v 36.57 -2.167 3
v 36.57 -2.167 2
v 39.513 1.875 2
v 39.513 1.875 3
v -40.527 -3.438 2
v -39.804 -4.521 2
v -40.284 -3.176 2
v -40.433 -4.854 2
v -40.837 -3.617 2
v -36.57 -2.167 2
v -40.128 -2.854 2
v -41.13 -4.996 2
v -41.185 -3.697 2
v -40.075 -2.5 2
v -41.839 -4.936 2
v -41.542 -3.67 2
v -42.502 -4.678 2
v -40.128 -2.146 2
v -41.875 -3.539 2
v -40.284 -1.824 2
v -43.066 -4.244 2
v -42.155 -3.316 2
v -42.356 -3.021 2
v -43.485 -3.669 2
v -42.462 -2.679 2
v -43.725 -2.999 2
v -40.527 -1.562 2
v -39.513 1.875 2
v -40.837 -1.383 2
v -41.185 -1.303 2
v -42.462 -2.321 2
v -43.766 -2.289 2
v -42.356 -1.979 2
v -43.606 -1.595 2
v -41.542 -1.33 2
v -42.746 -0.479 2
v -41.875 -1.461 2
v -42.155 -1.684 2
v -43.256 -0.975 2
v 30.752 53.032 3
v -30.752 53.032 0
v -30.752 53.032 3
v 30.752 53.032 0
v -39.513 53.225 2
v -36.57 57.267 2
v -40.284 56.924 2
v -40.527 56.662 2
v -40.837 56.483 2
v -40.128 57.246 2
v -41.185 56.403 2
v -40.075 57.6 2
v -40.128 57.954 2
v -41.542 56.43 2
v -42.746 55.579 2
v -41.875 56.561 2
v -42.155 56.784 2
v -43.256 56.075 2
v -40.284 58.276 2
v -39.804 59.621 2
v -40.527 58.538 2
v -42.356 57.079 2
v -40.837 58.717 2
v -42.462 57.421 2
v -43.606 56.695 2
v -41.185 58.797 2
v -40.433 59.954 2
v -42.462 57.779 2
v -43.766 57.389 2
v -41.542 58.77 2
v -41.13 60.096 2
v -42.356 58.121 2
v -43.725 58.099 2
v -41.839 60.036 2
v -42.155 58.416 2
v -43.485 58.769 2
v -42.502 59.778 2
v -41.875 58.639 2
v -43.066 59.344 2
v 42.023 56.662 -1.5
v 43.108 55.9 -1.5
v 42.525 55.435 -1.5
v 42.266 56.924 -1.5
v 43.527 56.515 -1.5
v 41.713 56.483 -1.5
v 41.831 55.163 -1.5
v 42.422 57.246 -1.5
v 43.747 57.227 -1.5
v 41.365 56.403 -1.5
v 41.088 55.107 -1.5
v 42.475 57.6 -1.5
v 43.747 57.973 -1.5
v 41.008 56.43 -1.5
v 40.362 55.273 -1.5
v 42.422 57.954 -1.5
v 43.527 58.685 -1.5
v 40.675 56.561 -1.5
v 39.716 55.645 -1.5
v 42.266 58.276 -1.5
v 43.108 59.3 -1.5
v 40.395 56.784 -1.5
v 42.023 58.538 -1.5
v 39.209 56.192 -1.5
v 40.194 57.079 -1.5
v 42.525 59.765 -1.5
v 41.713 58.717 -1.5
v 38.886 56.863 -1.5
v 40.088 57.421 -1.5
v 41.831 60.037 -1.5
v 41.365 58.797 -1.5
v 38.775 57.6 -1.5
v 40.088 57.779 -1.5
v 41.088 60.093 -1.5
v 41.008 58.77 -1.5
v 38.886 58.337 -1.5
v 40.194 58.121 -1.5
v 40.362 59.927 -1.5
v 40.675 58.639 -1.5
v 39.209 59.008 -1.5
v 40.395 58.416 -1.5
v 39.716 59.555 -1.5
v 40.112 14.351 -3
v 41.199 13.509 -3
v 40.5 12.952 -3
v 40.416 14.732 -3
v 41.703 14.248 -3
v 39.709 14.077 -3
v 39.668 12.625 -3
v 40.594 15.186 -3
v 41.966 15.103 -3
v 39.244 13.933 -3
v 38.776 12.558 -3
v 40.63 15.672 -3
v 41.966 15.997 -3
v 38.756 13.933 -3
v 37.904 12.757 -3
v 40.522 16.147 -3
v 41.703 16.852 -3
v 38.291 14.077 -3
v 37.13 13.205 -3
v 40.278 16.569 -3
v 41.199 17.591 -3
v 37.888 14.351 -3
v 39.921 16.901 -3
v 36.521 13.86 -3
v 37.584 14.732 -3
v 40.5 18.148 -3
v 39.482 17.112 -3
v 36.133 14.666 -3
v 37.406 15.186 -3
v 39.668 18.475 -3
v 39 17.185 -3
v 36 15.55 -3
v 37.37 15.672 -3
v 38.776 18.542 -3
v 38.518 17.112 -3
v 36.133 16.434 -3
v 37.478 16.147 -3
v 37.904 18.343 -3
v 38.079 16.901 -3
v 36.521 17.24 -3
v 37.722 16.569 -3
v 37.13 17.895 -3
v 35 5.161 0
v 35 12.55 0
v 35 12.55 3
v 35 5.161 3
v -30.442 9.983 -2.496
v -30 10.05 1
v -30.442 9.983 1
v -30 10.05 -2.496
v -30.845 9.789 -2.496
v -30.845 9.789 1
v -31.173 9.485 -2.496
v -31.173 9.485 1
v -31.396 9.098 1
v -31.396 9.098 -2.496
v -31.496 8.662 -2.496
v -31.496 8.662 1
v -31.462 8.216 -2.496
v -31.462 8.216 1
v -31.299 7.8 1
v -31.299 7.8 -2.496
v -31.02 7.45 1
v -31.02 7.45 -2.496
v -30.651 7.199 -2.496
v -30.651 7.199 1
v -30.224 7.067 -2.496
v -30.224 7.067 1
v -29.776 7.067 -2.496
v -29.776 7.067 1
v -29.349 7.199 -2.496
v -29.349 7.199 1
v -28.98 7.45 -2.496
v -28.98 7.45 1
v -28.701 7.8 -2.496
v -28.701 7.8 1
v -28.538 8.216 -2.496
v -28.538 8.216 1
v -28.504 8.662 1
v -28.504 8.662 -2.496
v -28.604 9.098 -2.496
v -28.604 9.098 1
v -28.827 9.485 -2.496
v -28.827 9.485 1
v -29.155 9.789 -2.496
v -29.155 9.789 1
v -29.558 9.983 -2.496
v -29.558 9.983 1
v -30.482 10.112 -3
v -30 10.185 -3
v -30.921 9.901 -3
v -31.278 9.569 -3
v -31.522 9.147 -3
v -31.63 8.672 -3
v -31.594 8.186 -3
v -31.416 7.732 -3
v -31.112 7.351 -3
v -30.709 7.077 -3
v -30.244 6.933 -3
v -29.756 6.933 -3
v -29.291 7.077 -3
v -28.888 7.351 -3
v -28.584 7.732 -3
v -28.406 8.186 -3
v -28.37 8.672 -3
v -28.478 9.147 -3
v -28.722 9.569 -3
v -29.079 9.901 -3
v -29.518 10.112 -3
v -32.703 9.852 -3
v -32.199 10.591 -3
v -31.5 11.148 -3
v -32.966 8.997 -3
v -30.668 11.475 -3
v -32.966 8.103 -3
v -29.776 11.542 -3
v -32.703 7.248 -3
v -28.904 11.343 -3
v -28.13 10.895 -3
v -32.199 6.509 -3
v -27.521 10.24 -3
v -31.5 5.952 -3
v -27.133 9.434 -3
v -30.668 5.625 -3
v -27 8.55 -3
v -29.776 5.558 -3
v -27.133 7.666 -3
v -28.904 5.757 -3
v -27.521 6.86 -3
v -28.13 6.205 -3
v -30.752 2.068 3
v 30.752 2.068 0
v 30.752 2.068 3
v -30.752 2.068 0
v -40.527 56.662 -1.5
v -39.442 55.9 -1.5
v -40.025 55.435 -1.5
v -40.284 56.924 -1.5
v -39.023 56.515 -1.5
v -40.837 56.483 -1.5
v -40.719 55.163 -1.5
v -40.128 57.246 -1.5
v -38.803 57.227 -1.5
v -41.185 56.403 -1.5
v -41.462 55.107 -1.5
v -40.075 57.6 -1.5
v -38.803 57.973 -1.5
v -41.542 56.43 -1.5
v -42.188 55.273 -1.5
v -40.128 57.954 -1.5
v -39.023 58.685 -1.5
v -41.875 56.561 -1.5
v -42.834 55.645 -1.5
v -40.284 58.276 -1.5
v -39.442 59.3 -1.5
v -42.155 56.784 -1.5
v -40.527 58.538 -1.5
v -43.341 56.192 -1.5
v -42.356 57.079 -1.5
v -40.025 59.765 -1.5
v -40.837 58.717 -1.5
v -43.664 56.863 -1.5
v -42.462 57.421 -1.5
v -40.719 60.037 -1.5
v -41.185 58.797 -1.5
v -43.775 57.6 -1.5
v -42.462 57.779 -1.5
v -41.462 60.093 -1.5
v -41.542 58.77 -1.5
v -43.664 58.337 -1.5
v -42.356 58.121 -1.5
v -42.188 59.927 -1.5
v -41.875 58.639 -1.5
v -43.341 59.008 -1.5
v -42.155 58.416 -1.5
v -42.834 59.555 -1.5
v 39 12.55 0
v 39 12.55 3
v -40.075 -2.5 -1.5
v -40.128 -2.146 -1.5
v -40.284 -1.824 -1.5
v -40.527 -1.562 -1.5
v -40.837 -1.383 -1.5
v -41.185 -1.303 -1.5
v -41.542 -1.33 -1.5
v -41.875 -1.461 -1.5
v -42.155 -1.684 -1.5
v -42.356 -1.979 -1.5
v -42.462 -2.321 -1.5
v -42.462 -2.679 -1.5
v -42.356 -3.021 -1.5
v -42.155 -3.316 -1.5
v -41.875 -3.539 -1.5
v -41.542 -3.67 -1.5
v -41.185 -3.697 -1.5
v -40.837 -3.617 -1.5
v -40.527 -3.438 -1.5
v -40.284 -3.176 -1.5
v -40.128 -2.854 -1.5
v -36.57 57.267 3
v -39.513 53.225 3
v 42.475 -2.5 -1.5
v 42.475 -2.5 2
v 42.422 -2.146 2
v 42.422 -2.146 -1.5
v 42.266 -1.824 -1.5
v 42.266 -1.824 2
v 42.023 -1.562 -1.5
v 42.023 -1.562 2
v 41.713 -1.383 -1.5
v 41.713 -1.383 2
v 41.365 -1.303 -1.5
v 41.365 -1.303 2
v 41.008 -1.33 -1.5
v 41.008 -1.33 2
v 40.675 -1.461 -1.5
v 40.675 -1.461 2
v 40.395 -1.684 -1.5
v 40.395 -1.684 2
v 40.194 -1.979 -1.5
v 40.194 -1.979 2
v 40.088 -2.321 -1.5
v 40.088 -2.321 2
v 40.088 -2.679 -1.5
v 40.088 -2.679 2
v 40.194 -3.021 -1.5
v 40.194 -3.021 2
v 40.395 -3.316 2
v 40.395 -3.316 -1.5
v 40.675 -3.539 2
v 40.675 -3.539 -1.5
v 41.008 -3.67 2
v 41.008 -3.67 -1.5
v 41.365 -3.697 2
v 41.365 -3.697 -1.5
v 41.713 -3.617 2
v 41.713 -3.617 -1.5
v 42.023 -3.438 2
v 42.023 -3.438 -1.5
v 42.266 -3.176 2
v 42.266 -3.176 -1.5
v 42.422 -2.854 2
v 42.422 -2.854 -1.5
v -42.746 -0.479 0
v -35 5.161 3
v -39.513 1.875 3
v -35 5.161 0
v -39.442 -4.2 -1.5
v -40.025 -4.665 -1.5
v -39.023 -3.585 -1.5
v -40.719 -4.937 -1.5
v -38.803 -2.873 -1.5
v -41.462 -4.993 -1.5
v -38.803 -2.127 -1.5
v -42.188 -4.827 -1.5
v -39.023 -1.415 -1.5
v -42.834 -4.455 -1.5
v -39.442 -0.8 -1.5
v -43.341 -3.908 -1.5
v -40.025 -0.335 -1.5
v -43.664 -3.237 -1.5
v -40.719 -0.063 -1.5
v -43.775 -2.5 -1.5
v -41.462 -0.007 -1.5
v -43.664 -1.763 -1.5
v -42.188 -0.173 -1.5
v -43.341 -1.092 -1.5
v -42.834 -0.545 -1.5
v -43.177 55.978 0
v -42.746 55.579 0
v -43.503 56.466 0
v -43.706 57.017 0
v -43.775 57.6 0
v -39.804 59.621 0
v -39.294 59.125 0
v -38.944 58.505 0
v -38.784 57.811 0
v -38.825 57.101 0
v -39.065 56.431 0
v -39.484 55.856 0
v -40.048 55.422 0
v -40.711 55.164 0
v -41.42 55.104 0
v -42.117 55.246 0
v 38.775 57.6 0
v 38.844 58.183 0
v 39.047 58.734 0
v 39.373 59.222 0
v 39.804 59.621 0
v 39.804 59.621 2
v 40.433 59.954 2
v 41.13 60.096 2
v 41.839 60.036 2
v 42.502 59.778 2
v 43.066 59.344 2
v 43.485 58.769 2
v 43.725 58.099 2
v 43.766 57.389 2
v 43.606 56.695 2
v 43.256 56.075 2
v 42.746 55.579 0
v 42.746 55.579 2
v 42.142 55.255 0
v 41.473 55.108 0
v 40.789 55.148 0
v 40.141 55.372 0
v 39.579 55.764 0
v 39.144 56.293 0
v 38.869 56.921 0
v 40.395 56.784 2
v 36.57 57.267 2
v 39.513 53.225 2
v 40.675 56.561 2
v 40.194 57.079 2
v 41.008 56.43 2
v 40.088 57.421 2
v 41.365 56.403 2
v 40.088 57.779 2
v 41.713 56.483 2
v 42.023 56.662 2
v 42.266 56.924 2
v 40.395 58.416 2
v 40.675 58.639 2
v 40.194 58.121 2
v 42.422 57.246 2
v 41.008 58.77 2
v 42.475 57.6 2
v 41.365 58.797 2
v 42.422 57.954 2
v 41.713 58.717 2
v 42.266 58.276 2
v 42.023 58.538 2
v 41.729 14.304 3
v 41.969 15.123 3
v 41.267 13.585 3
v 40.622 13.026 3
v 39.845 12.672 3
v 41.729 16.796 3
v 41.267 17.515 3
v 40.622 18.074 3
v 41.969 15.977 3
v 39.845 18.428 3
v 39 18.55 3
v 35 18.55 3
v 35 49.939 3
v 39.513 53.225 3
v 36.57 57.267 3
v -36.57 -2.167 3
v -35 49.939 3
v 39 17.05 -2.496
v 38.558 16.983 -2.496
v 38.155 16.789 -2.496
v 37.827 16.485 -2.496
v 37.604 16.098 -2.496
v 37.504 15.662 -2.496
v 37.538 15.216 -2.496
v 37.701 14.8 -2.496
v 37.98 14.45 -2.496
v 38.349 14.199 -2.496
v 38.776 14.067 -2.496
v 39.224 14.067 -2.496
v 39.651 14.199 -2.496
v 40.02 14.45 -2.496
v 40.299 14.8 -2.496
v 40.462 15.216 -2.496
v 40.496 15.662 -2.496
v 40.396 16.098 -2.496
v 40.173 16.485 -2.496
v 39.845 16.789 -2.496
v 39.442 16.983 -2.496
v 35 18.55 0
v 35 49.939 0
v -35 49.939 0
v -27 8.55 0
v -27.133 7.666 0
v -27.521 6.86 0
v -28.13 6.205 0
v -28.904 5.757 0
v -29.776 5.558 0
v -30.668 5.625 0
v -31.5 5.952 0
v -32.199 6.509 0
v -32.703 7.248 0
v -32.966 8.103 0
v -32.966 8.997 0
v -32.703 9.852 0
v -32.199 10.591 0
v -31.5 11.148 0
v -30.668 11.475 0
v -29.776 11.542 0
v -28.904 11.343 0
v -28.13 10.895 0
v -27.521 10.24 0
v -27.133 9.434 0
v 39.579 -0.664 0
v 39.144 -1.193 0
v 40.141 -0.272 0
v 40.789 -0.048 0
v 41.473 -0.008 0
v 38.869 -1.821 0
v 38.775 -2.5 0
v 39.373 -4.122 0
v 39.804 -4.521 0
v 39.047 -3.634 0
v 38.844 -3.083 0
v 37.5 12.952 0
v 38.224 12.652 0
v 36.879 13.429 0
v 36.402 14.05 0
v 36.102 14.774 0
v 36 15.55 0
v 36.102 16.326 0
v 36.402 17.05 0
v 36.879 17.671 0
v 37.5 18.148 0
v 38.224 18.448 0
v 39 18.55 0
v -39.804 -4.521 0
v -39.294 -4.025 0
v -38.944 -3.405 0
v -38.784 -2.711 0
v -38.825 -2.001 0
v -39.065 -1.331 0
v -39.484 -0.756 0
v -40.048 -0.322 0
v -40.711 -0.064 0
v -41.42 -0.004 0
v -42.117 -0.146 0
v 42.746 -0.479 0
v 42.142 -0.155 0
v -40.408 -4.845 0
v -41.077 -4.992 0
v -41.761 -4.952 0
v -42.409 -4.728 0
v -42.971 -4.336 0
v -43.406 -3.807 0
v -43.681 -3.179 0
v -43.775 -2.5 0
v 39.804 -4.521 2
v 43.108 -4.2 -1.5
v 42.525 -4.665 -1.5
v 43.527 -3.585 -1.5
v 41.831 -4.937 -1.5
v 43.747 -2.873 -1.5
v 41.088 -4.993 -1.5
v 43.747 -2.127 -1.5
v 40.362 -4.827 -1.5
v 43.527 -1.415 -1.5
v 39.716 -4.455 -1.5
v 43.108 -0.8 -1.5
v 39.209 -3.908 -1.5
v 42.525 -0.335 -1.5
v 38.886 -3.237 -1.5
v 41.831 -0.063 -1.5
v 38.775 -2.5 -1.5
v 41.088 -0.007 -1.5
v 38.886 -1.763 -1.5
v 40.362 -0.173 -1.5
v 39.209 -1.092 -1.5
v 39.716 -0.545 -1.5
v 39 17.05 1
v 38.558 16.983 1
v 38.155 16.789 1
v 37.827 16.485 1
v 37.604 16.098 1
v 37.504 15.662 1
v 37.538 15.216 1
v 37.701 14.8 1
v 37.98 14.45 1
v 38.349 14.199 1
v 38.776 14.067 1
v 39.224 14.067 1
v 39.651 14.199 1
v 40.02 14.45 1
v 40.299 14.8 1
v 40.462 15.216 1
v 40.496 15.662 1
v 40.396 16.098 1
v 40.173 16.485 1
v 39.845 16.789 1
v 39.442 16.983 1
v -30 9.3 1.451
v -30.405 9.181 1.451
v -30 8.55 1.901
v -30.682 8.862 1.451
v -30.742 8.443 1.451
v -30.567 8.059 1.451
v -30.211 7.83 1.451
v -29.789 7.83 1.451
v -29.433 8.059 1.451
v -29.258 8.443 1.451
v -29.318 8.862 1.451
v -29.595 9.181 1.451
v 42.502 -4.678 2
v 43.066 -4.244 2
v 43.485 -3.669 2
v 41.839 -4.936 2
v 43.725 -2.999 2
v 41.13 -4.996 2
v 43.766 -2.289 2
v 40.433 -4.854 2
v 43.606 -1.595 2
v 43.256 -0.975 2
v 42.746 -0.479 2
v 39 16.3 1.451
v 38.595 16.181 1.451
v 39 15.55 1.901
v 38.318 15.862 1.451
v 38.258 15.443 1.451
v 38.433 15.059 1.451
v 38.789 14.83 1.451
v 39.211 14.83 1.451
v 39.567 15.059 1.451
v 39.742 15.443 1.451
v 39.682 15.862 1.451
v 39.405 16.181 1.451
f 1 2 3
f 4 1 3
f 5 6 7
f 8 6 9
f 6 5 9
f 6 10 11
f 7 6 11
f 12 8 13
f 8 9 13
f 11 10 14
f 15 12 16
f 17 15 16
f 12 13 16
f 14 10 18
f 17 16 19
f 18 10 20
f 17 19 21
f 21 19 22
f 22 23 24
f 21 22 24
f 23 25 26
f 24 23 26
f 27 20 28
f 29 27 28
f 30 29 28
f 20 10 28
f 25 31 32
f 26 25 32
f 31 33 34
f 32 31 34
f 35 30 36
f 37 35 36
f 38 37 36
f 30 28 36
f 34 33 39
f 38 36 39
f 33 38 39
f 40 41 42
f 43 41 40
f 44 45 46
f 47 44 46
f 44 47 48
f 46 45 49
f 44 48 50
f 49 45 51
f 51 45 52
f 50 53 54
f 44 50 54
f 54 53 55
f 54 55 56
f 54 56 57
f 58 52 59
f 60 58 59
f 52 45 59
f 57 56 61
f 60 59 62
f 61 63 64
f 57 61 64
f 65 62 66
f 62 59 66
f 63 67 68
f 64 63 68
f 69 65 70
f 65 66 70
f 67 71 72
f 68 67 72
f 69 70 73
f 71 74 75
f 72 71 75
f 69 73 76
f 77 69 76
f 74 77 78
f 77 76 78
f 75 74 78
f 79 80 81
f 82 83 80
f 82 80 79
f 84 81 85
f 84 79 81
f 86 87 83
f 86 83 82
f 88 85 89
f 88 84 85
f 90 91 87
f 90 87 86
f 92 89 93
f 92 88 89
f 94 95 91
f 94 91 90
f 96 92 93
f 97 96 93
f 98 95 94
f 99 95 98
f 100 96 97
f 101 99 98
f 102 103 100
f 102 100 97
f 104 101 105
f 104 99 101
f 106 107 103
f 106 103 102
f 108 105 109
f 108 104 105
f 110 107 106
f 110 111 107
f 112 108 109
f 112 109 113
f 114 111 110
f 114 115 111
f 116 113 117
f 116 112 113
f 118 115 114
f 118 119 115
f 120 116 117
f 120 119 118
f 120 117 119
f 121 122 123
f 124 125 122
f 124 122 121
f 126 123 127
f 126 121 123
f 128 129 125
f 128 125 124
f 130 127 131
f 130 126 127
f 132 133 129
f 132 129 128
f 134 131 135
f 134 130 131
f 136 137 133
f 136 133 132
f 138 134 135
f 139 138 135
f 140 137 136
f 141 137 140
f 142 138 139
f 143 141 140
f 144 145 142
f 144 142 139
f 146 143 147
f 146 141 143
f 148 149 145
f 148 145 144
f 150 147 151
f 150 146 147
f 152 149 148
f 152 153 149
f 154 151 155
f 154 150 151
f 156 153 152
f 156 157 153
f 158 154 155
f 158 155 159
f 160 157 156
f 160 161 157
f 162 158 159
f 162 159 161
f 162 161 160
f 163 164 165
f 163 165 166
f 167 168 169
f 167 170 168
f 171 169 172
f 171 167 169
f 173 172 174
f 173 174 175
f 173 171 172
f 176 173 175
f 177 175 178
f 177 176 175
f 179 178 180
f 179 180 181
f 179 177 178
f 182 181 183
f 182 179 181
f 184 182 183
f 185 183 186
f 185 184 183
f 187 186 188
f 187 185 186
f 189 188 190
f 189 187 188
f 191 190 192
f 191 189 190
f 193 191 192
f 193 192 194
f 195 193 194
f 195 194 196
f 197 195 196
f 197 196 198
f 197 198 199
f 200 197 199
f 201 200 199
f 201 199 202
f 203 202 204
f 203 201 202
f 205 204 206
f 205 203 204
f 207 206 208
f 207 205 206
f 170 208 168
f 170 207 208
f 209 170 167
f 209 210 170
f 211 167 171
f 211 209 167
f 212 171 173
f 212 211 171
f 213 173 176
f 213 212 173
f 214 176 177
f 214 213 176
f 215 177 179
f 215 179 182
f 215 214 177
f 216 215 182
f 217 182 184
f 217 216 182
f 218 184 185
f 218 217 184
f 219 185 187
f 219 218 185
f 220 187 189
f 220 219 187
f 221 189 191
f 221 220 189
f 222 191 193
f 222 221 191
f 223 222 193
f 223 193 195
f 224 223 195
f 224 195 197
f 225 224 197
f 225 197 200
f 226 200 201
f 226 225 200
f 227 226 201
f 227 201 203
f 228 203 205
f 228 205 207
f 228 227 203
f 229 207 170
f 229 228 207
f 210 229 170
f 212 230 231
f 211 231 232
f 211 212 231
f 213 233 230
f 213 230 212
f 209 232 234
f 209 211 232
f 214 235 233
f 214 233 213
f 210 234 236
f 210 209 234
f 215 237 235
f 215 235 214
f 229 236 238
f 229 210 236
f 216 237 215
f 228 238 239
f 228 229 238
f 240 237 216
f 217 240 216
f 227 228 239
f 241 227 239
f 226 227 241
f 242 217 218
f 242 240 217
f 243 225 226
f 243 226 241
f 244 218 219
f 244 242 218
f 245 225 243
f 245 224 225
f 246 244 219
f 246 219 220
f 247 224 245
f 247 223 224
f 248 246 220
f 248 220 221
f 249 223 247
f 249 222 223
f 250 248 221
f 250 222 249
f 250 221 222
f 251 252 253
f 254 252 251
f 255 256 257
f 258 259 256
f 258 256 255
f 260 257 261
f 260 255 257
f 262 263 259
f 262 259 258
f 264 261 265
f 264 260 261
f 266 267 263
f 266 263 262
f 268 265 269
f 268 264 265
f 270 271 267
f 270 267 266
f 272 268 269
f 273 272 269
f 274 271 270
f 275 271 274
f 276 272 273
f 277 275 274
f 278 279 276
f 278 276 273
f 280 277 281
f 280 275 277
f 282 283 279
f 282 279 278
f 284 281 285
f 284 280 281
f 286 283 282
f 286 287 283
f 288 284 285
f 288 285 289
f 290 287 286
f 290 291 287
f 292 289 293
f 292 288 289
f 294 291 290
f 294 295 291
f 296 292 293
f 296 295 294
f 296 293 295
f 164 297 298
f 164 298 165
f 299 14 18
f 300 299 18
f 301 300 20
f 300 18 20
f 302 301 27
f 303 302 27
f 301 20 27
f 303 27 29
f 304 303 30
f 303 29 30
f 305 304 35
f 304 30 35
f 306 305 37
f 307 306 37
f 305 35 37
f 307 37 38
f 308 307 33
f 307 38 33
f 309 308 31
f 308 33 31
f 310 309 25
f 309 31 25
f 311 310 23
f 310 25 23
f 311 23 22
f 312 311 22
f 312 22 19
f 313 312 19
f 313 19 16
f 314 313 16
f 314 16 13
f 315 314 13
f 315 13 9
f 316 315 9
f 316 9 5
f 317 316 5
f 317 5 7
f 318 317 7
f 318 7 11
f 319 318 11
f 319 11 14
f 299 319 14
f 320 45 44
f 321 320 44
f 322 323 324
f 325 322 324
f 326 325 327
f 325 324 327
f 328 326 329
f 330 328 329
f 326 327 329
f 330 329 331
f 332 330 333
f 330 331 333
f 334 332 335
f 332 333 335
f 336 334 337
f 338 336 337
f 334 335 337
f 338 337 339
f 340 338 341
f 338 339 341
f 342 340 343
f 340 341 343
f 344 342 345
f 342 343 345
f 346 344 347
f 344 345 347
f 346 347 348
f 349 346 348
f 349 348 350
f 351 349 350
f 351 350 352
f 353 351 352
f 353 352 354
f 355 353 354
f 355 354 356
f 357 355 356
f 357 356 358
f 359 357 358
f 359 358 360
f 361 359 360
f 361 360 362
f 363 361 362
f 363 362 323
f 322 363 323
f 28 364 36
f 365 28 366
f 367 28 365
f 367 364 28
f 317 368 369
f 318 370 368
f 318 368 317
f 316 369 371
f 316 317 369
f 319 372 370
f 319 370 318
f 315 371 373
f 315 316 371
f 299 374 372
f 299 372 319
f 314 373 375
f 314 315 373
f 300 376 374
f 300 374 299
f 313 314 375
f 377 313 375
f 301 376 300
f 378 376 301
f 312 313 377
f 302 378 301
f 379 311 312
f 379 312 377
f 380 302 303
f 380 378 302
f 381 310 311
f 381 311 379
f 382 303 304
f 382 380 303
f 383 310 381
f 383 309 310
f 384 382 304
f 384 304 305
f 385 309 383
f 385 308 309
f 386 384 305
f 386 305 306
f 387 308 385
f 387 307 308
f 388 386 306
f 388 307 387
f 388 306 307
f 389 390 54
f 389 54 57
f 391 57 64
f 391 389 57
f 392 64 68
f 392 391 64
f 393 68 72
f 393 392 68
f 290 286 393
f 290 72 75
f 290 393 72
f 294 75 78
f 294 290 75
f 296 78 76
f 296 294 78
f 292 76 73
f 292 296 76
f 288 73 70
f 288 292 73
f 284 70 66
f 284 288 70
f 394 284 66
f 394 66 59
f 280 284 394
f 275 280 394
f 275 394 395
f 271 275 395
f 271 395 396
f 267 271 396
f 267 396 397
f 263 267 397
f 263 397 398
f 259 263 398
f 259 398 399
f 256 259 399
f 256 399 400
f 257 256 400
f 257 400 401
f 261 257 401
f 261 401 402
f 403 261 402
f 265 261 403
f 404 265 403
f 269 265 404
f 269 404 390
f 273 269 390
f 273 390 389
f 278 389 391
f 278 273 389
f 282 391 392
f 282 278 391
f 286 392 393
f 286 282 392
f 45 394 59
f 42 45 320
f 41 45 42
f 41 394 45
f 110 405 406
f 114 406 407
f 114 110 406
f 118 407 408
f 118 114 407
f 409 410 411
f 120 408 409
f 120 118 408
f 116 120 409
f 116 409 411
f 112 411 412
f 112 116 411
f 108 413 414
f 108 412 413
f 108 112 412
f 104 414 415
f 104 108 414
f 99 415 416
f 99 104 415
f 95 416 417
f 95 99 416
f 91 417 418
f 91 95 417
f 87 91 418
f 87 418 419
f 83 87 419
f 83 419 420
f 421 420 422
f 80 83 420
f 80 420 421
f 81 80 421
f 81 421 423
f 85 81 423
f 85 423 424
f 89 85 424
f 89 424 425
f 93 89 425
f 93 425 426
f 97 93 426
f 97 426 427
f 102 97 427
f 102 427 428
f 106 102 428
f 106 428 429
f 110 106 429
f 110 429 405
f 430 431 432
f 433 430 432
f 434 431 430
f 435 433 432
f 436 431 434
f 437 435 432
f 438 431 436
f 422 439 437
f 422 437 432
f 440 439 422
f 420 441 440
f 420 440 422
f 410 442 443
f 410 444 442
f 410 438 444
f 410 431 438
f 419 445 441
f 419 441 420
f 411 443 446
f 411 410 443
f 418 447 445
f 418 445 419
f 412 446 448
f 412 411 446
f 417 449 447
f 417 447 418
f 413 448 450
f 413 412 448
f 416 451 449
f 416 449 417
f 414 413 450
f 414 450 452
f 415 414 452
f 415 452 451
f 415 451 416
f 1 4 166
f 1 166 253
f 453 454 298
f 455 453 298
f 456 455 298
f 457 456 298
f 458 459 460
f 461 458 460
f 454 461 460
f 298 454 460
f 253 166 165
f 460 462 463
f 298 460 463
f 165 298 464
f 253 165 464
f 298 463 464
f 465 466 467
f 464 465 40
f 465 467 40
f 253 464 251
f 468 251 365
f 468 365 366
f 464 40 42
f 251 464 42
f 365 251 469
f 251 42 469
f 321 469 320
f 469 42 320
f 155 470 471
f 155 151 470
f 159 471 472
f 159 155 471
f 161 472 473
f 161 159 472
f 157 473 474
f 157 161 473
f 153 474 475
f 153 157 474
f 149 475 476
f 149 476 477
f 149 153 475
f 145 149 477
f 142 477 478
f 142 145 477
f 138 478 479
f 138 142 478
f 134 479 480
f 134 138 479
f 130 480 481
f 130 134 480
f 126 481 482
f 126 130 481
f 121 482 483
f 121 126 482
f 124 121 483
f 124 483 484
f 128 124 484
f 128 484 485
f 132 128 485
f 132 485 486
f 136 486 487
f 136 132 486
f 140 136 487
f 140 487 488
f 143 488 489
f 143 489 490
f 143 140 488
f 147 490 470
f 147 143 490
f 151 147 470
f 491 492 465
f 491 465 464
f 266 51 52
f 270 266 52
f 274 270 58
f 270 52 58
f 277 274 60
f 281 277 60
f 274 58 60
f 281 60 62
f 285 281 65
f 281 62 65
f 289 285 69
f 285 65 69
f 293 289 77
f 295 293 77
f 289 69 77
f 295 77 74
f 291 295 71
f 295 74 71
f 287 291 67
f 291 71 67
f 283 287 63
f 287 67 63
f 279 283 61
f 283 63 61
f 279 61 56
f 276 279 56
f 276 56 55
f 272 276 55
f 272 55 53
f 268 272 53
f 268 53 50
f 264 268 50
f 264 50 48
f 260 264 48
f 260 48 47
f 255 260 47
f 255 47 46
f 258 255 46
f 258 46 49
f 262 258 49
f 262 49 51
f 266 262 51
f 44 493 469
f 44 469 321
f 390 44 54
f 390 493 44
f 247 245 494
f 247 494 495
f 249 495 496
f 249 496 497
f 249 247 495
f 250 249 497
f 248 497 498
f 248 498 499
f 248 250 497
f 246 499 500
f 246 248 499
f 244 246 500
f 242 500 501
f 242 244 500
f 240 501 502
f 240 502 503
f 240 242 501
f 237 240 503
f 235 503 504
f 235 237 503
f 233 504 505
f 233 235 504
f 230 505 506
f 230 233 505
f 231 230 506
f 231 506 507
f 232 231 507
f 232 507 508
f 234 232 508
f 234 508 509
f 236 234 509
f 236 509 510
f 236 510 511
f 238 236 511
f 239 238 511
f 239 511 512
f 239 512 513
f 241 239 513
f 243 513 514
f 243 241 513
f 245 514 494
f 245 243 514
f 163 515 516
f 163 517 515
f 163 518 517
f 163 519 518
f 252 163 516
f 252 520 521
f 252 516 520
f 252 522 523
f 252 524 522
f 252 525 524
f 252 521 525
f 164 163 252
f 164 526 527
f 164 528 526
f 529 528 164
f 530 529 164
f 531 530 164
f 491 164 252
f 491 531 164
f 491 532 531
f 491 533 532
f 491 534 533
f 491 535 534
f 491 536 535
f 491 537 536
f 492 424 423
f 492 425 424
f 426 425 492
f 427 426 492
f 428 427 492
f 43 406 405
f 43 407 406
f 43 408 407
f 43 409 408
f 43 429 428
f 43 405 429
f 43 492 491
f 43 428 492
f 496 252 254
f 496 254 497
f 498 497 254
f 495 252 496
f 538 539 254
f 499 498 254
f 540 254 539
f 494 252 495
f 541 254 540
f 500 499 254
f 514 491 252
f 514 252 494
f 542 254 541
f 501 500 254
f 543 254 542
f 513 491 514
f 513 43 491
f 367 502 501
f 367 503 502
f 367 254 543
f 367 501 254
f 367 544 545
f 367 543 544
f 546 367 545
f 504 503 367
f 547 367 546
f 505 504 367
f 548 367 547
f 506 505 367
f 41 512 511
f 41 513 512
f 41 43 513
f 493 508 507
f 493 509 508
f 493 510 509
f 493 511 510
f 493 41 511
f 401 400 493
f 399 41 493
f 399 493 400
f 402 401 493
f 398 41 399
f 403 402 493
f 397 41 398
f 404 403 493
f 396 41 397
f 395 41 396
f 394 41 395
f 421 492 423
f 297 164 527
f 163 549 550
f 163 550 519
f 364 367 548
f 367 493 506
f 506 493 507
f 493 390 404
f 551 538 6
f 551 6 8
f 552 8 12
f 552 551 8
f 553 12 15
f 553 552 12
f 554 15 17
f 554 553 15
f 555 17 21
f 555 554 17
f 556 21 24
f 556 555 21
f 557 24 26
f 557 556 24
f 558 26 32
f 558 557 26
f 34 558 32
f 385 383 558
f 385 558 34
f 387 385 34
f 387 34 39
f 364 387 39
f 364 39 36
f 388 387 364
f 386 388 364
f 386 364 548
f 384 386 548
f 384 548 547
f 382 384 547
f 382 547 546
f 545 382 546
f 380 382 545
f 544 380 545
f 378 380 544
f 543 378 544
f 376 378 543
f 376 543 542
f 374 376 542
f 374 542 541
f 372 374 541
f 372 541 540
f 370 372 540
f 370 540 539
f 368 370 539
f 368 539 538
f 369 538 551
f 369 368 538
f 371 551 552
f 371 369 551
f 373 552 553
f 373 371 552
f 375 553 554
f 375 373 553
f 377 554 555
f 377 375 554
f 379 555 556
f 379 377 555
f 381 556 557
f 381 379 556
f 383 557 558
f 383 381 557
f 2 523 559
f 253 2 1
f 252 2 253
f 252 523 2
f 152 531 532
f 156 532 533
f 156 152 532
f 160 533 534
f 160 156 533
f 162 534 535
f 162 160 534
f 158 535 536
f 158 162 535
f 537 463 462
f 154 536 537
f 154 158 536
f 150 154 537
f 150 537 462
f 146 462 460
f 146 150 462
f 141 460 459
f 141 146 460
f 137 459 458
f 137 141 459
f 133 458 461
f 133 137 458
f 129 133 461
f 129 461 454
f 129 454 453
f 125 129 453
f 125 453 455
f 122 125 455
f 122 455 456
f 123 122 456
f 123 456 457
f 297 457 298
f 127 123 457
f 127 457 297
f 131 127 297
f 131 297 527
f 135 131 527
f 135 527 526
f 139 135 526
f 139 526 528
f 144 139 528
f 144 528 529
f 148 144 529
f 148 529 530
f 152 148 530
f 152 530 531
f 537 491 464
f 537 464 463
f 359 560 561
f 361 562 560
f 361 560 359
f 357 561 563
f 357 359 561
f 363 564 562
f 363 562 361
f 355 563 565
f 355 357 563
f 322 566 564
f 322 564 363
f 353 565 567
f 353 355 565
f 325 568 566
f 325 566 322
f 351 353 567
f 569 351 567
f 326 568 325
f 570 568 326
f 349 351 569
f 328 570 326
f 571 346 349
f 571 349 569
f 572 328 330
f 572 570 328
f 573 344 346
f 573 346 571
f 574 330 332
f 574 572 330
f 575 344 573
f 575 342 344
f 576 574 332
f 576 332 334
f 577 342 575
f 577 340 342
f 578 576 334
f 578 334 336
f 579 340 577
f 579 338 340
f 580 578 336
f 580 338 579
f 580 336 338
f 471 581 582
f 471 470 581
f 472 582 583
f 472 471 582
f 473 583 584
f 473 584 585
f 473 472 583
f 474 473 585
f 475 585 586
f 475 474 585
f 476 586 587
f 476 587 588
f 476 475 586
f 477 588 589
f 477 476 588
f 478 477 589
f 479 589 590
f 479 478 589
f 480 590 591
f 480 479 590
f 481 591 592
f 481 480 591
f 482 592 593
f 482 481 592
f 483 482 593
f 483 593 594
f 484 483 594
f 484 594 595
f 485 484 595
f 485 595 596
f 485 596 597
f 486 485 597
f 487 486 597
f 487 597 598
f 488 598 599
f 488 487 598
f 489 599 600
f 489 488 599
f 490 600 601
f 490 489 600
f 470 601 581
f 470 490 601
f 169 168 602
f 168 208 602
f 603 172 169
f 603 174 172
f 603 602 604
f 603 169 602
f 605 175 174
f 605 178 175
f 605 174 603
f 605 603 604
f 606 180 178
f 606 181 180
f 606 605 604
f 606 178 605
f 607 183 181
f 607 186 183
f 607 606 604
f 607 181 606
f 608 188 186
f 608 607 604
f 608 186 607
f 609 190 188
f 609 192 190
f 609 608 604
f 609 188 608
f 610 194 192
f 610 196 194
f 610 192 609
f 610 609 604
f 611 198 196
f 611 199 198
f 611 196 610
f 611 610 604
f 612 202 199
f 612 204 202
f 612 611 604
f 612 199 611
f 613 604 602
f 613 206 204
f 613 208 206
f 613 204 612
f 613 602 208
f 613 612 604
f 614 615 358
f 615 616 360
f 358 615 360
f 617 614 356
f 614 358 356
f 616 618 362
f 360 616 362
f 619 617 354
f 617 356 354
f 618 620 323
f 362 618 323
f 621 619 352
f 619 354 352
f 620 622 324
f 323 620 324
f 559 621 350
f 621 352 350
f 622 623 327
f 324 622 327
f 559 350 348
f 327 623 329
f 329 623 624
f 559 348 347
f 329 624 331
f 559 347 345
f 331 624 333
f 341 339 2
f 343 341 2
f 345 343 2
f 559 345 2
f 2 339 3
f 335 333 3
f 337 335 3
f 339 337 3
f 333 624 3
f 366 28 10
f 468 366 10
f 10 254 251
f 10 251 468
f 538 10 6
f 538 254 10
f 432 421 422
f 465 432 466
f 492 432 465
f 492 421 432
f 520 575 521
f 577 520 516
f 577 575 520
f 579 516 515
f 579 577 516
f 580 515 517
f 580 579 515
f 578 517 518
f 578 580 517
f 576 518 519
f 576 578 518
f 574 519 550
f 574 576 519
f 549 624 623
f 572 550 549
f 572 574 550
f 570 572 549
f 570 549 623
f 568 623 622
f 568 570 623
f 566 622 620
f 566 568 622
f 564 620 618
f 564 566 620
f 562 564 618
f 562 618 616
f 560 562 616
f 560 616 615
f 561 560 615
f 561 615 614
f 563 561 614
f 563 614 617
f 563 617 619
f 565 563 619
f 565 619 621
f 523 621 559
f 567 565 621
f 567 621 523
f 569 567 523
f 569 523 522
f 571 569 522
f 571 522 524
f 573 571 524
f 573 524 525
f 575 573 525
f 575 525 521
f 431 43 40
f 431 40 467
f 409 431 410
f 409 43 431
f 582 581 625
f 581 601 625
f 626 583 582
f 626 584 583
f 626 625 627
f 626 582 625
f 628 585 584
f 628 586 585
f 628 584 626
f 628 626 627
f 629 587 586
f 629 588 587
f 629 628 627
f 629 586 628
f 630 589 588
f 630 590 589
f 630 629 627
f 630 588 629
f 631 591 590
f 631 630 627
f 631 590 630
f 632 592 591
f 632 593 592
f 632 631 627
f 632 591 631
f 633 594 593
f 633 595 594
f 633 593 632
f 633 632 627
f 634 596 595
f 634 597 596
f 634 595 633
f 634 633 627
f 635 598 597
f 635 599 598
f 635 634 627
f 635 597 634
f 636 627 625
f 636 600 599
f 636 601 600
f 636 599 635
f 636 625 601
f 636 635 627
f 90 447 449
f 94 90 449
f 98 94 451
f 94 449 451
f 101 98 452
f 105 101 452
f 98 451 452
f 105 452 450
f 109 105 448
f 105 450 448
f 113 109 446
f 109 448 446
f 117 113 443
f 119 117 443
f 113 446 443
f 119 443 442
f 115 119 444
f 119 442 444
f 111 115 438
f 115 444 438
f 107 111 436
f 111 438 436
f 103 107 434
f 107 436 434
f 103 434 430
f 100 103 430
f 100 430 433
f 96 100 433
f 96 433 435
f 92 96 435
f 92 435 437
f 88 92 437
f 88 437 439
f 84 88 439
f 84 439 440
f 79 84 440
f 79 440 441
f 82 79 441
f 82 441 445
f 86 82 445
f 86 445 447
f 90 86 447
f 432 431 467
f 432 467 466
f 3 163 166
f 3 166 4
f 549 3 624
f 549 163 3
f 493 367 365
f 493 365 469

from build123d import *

# Parameters (mm, degrees)
BOSS_EXTRUDE1_DEPTH                            = 3
BOSS_EXTRUDE4_START                            = 1.5
SKETCH5_R                                      = 2.5
BOSS_EXTRUDE4_DEPTH                            = 1.5
SKETCH3_R                                      = 1.2
CUT_EXTRUDE1_DEPTH                             = 75.488325428
CUT_EXTRUDE2_START                             = -1
CUT_EXTRUDE2_DEPTH                             = 1
BOSS_EXTRUDE6_START                            = 3
SKETCH8_R                                      = 3
BOSS_EXTRUDE6_DEPTH                            = 3
CSK_FOR_M2_FLAT_HEAD_MACHINE_SCREW1_AT_2_COUNT = 2
CSK_FOR_M2_FLAT_HEAD_MACHINE_SCREW1_AT_2_PITCH = 69.354163538


with BuildPart() as part:
    # Sketch1 → Boss-Extrude1 (new body)
    with BuildSketch(Plane.XY):
        with BuildLine():
            Line((-39.803551907, 59.621098837), (-30.752483537, 53.031526348))
            Line((-30.752483537, 53.031526348), (30.752483537, 53.031526348))
            Line((30.752483537, 53.031526348), (39.803551907, 59.621098837))
            ThreePointArc((39.803551907, 59.621098837), (43.296098837, 59.071448093), (42.746448093, 55.578901163))
            Line((42.746448093, 55.578901163), (35, 49.939149129))
            Line((35, 49.939149129), (35, 18.55))
            Line((35, 18.55), (39, 18.55))
            ThreePointArc((39, 18.55), (42, 15.55), (39, 12.55))
            Line((39, 12.55), (35, 12.55))
            Line((35, 12.55), (35, 5.160850871))
            Line((35, 5.160850871), (42.746448093, -0.478901163))
            ThreePointArc((42.746448093, -0.478901163), (43.296098837, -3.971448093), (39.803551907, -4.521098837))
            Line((39.803551907, -4.521098837), (30.752483537, 2.068473652))
            Line((30.752483537, 2.068473652), (-30.752483537, 2.068473652))
            Line((-30.752483537, 2.068473652), (-39.803551907, -4.521098837))
            ThreePointArc((-39.803551907, -4.521098837), (-43.296098837, -3.971448093), (-42.746448093, -0.478901163))
            Line((-42.746448093, -0.478901163), (-35, 5.160850871))
            Line((-35, 5.160850871), (-35, 49.939149129))
            Line((-35, 49.939149129), (-42.746448093, 55.578901163))
            ThreePointArc((-42.746448093, 55.578901163), (-43.296098837, 59.071448093), (-39.803551907, 59.621098837))
        make_face()
    extrude(amount=BOSS_EXTRUDE1_DEPTH)

    # Sketch5 → Boss-Extrude4 (add)
    with BuildSketch(Plane(origin=(0, 0, 0), x_dir=(-1, 0, 0), z_dir=(0, 0, -1)).offset(BOSS_EXTRUDE4_START)):
        with Locations((-41.275, 57.6)):
            Circle(SKETCH5_R)
        with Locations((41.275, 57.6)):
            Circle(SKETCH5_R)
        with Locations((-41.275, -2.5)):
            Circle(SKETCH5_R)
        with Locations((41.275, -2.5)):
            Circle(SKETCH5_R)
    extrude(amount=-BOSS_EXTRUDE4_DEPTH)

    # Sketch3 → Cut-Extrude1 (cut, through all)
    with BuildSketch(Plane.XY.offset(3)):
        with Locations((-41.275, 57.6)):
            Circle(SKETCH3_R)
        with Locations((41.275, 57.6)):
            Circle(SKETCH3_R)
        with Locations((-41.275, -2.5)):
            Circle(SKETCH3_R)
        with Locations((41.275, -2.5)):
            Circle(SKETCH3_R)
    extrude(amount=-CUT_EXTRUDE1_DEPTH, mode=Mode.SUBTRACT)

    # Sketch7 → Cut-Extrude2 (cut)
    with BuildSketch(Plane.XY.offset(3).offset(CUT_EXTRUDE2_START)):
        with BuildLine():
            Line((-36.569793768, 57.266781888), (-39.512689954, 53.224584214))
            Line((-39.512689954, 53.224584214), (-42.746448093, 55.578901163))
            ThreePointArc((-42.746448093, 55.578901163), (-43.296098837, 59.071448093), (-39.803551907, 59.621098837))
            Line((-39.803551907, 59.621098837), (-36.569793768, 57.266781888))
        make_face()
        with BuildLine():
            Line((-42.746448093, -0.478901163), (-39.512689954, 1.875415786))
            Line((-39.512689954, 1.875415786), (-36.569793768, -2.166781888))
            Line((-36.569793768, -2.166781888), (-39.803551907, -4.521098837))
            ThreePointArc((-39.803551907, -4.521098837), (-43.296098837, -3.971448093), (-42.746448093, -0.478901163))
        make_face()
        with BuildLine():
            Line((39.803551907, -4.521098837), (36.569793768, -2.166781888))
            Line((36.569793768, -2.166781888), (39.512689954, 1.875415786))
            Line((39.512689954, 1.875415786), (42.746448093, -0.478901163))
            ThreePointArc((42.746448093, -0.478901163), (43.296098837, -3.971448093), (39.803551907, -4.521098837))
        make_face()
        with BuildLine():
            Line((39.803551907, 59.621098837), (36.569793768, 57.266781888))
            Line((36.569793768, 57.266781888), (39.512689954, 53.224584214))
            Line((39.512689954, 53.224584214), (42.746448093, 55.578901163))
            ThreePointArc((42.746448093, 55.578901163), (43.296098837, 59.071448093), (39.803551907, 59.621098837))
        make_face()
    extrude(amount=CUT_EXTRUDE2_DEPTH, mode=Mode.SUBTRACT)

    # Sketch8 → Boss-Extrude6 (add)
    with BuildSketch(Plane(origin=(0, 0, 0), x_dir=(-1, 0, 0), z_dir=(0, 0, -1)).offset(BOSS_EXTRUDE6_START)):
        with Locations((-39, 15.55)):
            Circle(SKETCH8_R)
        with Locations(Location((30, 8.55, 0), (0, 0, 180))):
            Circle(SKETCH8_R)
    extrude(amount=-BOSS_EXTRUDE6_DEPTH)

    # Sketch11 → CSK for M2 Flat Head Machine Screw1 (revolve, cut)
    with BuildSketch(Plane(origin=(39, 15.55, -3), x_dir=(0, 1, 0), z_dir=(1, 0, 0))):
        Polygon((0, 0), (0, 4.901290929), (1.5, 4), (1.5, 0.503826859), (1.635, 0), align=None)
    csk_for_m2_flat_head_machine_screw1 = revolve(axis=Axis((39, 15.55, -9.35), (0, 0, 1)), mode=Mode.SUBTRACT)

    # CSK for M2 Flat Head Machine Screw1 at 2: CSK for M2 Flat Head Machine Screw1 ×2
    with Locations(*[Vector(-0.9948934062566149, -0.10093121512748267, 0) * (i * CSK_FOR_M2_FLAT_HEAD_MACHINE_SCREW1_AT_2_PITCH) for i in range(1, CSK_FOR_M2_FLAT_HEAD_MACHINE_SCREW1_AT_2_COUNT)]):
        add(csk_for_m2_flat_head_machine_screw1, mode=Mode.SUBTRACT)


solid = part.part
